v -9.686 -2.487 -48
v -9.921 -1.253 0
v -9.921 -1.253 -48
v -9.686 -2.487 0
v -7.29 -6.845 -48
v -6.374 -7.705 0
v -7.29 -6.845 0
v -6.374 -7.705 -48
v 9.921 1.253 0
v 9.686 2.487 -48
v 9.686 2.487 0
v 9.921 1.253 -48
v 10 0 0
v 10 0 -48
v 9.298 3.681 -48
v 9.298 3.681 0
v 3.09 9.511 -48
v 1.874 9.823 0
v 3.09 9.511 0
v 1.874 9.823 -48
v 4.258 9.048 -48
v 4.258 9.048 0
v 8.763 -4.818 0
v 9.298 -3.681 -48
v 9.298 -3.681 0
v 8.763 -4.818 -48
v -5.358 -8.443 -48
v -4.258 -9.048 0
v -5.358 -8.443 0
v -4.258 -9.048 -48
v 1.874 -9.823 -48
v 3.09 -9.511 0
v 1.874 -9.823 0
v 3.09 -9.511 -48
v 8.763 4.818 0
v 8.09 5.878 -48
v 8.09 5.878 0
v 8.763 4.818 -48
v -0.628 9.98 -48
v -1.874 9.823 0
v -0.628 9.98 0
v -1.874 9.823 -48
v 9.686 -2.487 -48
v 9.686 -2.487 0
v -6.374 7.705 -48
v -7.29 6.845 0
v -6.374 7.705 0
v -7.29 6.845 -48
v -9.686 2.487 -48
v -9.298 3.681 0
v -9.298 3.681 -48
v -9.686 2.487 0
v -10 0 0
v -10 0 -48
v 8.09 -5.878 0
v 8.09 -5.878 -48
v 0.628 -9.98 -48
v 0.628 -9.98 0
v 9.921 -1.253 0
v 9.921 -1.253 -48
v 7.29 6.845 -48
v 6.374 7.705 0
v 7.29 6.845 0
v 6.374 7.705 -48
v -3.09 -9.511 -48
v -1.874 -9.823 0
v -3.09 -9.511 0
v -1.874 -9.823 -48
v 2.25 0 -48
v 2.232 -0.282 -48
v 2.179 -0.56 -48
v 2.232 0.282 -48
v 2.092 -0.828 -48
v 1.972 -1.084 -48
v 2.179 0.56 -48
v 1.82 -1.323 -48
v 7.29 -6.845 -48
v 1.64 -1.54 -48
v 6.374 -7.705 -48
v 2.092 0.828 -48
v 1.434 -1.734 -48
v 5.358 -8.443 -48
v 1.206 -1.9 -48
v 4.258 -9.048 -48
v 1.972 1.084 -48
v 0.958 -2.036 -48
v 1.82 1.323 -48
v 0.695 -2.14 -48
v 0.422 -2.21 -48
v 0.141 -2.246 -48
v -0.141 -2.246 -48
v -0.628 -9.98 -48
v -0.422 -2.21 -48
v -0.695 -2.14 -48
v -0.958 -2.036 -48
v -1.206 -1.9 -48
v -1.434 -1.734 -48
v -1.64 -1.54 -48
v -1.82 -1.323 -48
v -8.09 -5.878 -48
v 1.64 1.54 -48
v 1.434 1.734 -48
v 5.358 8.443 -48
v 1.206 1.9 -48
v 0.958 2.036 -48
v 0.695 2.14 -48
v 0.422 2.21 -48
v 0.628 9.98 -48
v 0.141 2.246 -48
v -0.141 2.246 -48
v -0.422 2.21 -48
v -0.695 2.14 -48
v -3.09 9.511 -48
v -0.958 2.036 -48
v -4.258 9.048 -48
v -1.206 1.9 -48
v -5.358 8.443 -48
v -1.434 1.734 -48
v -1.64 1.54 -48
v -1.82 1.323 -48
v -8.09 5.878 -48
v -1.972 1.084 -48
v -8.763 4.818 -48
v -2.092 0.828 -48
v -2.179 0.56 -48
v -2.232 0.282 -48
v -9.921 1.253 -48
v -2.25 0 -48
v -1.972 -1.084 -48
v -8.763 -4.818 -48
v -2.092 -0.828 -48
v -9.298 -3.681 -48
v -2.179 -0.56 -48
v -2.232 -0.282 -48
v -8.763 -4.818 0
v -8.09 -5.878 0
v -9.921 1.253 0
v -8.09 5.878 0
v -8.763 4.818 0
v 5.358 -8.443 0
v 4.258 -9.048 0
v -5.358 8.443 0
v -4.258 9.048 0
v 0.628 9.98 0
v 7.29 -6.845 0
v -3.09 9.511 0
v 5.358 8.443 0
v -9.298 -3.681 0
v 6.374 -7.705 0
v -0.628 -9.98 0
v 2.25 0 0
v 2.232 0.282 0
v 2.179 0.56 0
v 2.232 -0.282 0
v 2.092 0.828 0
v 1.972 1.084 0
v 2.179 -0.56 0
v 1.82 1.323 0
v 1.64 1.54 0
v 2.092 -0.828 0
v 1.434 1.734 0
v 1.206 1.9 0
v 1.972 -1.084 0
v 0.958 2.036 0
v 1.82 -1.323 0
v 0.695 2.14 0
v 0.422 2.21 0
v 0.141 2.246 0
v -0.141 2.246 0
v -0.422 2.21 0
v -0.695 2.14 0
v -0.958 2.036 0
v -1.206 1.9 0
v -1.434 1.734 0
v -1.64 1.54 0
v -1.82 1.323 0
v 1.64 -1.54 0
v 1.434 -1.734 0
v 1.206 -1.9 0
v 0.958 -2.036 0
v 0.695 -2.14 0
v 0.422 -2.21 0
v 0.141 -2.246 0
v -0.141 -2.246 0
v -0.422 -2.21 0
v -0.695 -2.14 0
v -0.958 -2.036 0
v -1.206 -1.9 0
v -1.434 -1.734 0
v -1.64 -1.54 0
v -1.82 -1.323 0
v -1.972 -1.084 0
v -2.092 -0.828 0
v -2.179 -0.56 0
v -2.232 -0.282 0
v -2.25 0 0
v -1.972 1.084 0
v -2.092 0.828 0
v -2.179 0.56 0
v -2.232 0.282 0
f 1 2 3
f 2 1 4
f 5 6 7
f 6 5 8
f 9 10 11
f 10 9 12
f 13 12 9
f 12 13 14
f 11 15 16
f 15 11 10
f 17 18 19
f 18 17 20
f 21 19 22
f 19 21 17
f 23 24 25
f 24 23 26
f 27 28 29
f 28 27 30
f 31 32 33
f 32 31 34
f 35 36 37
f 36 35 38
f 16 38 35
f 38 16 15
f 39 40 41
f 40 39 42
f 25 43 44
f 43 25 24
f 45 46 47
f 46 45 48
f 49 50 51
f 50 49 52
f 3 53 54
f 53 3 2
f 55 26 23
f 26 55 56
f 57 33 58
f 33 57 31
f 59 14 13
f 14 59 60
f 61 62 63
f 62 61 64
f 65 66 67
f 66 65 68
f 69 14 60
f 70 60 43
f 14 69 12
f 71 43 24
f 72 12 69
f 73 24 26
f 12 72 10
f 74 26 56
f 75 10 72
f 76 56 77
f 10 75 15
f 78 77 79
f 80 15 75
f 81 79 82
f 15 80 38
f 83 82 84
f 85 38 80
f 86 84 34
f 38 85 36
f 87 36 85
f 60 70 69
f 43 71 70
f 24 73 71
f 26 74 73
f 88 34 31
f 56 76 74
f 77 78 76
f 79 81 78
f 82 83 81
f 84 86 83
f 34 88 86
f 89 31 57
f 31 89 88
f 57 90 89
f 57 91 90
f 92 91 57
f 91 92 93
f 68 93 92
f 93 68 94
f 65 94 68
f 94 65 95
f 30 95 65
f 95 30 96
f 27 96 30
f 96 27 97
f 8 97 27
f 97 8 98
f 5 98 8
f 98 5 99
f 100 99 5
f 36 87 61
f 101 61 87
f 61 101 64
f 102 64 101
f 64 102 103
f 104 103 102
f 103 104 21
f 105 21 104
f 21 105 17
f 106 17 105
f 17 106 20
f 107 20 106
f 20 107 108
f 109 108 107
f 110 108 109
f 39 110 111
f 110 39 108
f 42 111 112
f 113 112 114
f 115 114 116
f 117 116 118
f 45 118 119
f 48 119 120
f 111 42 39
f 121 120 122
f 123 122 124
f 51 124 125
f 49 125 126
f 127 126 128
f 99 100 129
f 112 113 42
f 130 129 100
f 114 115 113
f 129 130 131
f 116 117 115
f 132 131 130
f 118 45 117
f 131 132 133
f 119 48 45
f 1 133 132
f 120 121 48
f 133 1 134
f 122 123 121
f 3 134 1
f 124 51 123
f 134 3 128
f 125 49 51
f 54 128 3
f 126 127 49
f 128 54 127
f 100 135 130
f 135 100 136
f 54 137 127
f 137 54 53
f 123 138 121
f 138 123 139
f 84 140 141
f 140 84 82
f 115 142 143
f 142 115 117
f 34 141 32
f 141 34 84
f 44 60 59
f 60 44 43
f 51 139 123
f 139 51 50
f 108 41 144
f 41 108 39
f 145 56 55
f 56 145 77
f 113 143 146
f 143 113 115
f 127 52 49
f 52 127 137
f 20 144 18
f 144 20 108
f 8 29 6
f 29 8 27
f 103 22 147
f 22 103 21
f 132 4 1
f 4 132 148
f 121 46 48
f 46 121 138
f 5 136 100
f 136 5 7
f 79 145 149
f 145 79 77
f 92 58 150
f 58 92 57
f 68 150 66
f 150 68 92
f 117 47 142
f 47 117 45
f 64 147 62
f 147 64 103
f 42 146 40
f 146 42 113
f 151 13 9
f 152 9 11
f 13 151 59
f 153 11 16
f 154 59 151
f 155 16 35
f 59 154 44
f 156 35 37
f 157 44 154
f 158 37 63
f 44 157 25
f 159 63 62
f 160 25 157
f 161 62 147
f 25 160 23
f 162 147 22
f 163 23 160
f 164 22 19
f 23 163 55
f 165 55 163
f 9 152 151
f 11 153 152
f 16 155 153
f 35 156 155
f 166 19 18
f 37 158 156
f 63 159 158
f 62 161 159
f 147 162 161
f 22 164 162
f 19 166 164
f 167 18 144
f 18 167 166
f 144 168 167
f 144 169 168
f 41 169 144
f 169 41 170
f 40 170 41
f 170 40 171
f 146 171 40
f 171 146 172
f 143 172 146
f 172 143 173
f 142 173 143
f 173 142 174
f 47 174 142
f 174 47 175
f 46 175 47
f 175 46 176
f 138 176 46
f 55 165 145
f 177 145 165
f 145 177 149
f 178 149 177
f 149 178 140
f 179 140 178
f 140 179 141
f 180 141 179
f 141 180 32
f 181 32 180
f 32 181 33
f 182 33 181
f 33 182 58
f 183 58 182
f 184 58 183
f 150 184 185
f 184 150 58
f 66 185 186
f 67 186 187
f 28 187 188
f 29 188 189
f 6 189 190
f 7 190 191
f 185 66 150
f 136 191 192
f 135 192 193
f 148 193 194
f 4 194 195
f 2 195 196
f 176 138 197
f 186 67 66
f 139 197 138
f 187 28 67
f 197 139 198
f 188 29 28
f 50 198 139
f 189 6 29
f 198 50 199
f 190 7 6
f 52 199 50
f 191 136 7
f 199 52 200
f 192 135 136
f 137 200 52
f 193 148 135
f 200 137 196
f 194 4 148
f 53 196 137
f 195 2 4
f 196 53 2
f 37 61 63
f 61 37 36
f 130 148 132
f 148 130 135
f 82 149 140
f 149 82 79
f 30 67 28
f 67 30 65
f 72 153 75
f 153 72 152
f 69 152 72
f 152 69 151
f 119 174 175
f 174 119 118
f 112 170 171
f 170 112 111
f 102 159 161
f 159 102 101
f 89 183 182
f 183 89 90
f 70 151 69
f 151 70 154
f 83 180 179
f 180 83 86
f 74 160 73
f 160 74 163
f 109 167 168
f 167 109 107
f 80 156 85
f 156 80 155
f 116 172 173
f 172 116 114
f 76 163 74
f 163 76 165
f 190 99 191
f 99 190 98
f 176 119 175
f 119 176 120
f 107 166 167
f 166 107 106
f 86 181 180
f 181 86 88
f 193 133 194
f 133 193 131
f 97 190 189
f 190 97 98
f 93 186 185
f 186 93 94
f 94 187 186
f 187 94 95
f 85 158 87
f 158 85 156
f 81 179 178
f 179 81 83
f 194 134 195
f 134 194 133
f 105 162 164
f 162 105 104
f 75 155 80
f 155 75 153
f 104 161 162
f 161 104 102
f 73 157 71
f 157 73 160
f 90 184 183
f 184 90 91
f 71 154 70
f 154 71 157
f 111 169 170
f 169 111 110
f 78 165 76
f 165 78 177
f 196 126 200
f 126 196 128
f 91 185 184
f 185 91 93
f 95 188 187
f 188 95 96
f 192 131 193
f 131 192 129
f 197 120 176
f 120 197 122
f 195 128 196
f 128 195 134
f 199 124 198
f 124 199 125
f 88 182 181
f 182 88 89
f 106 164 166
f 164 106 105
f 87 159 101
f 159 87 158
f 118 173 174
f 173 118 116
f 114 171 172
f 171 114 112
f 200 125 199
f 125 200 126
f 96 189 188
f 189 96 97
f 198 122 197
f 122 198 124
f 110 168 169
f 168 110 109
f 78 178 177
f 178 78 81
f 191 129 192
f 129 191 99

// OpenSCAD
$fn = 50;


difference() {
	union() {
		translate(v = [0, 0, -48.0000000000]) {
			cylinder(h = 48, r = 10.0000000000);
		}
		cylinder(h = 0, r = 19.0000000000);
	}
	union() {
		#translate(v = [0, 0, -48]) {
			cylinder(h = 48, r = 2.2500000000);
		}
	}
}
